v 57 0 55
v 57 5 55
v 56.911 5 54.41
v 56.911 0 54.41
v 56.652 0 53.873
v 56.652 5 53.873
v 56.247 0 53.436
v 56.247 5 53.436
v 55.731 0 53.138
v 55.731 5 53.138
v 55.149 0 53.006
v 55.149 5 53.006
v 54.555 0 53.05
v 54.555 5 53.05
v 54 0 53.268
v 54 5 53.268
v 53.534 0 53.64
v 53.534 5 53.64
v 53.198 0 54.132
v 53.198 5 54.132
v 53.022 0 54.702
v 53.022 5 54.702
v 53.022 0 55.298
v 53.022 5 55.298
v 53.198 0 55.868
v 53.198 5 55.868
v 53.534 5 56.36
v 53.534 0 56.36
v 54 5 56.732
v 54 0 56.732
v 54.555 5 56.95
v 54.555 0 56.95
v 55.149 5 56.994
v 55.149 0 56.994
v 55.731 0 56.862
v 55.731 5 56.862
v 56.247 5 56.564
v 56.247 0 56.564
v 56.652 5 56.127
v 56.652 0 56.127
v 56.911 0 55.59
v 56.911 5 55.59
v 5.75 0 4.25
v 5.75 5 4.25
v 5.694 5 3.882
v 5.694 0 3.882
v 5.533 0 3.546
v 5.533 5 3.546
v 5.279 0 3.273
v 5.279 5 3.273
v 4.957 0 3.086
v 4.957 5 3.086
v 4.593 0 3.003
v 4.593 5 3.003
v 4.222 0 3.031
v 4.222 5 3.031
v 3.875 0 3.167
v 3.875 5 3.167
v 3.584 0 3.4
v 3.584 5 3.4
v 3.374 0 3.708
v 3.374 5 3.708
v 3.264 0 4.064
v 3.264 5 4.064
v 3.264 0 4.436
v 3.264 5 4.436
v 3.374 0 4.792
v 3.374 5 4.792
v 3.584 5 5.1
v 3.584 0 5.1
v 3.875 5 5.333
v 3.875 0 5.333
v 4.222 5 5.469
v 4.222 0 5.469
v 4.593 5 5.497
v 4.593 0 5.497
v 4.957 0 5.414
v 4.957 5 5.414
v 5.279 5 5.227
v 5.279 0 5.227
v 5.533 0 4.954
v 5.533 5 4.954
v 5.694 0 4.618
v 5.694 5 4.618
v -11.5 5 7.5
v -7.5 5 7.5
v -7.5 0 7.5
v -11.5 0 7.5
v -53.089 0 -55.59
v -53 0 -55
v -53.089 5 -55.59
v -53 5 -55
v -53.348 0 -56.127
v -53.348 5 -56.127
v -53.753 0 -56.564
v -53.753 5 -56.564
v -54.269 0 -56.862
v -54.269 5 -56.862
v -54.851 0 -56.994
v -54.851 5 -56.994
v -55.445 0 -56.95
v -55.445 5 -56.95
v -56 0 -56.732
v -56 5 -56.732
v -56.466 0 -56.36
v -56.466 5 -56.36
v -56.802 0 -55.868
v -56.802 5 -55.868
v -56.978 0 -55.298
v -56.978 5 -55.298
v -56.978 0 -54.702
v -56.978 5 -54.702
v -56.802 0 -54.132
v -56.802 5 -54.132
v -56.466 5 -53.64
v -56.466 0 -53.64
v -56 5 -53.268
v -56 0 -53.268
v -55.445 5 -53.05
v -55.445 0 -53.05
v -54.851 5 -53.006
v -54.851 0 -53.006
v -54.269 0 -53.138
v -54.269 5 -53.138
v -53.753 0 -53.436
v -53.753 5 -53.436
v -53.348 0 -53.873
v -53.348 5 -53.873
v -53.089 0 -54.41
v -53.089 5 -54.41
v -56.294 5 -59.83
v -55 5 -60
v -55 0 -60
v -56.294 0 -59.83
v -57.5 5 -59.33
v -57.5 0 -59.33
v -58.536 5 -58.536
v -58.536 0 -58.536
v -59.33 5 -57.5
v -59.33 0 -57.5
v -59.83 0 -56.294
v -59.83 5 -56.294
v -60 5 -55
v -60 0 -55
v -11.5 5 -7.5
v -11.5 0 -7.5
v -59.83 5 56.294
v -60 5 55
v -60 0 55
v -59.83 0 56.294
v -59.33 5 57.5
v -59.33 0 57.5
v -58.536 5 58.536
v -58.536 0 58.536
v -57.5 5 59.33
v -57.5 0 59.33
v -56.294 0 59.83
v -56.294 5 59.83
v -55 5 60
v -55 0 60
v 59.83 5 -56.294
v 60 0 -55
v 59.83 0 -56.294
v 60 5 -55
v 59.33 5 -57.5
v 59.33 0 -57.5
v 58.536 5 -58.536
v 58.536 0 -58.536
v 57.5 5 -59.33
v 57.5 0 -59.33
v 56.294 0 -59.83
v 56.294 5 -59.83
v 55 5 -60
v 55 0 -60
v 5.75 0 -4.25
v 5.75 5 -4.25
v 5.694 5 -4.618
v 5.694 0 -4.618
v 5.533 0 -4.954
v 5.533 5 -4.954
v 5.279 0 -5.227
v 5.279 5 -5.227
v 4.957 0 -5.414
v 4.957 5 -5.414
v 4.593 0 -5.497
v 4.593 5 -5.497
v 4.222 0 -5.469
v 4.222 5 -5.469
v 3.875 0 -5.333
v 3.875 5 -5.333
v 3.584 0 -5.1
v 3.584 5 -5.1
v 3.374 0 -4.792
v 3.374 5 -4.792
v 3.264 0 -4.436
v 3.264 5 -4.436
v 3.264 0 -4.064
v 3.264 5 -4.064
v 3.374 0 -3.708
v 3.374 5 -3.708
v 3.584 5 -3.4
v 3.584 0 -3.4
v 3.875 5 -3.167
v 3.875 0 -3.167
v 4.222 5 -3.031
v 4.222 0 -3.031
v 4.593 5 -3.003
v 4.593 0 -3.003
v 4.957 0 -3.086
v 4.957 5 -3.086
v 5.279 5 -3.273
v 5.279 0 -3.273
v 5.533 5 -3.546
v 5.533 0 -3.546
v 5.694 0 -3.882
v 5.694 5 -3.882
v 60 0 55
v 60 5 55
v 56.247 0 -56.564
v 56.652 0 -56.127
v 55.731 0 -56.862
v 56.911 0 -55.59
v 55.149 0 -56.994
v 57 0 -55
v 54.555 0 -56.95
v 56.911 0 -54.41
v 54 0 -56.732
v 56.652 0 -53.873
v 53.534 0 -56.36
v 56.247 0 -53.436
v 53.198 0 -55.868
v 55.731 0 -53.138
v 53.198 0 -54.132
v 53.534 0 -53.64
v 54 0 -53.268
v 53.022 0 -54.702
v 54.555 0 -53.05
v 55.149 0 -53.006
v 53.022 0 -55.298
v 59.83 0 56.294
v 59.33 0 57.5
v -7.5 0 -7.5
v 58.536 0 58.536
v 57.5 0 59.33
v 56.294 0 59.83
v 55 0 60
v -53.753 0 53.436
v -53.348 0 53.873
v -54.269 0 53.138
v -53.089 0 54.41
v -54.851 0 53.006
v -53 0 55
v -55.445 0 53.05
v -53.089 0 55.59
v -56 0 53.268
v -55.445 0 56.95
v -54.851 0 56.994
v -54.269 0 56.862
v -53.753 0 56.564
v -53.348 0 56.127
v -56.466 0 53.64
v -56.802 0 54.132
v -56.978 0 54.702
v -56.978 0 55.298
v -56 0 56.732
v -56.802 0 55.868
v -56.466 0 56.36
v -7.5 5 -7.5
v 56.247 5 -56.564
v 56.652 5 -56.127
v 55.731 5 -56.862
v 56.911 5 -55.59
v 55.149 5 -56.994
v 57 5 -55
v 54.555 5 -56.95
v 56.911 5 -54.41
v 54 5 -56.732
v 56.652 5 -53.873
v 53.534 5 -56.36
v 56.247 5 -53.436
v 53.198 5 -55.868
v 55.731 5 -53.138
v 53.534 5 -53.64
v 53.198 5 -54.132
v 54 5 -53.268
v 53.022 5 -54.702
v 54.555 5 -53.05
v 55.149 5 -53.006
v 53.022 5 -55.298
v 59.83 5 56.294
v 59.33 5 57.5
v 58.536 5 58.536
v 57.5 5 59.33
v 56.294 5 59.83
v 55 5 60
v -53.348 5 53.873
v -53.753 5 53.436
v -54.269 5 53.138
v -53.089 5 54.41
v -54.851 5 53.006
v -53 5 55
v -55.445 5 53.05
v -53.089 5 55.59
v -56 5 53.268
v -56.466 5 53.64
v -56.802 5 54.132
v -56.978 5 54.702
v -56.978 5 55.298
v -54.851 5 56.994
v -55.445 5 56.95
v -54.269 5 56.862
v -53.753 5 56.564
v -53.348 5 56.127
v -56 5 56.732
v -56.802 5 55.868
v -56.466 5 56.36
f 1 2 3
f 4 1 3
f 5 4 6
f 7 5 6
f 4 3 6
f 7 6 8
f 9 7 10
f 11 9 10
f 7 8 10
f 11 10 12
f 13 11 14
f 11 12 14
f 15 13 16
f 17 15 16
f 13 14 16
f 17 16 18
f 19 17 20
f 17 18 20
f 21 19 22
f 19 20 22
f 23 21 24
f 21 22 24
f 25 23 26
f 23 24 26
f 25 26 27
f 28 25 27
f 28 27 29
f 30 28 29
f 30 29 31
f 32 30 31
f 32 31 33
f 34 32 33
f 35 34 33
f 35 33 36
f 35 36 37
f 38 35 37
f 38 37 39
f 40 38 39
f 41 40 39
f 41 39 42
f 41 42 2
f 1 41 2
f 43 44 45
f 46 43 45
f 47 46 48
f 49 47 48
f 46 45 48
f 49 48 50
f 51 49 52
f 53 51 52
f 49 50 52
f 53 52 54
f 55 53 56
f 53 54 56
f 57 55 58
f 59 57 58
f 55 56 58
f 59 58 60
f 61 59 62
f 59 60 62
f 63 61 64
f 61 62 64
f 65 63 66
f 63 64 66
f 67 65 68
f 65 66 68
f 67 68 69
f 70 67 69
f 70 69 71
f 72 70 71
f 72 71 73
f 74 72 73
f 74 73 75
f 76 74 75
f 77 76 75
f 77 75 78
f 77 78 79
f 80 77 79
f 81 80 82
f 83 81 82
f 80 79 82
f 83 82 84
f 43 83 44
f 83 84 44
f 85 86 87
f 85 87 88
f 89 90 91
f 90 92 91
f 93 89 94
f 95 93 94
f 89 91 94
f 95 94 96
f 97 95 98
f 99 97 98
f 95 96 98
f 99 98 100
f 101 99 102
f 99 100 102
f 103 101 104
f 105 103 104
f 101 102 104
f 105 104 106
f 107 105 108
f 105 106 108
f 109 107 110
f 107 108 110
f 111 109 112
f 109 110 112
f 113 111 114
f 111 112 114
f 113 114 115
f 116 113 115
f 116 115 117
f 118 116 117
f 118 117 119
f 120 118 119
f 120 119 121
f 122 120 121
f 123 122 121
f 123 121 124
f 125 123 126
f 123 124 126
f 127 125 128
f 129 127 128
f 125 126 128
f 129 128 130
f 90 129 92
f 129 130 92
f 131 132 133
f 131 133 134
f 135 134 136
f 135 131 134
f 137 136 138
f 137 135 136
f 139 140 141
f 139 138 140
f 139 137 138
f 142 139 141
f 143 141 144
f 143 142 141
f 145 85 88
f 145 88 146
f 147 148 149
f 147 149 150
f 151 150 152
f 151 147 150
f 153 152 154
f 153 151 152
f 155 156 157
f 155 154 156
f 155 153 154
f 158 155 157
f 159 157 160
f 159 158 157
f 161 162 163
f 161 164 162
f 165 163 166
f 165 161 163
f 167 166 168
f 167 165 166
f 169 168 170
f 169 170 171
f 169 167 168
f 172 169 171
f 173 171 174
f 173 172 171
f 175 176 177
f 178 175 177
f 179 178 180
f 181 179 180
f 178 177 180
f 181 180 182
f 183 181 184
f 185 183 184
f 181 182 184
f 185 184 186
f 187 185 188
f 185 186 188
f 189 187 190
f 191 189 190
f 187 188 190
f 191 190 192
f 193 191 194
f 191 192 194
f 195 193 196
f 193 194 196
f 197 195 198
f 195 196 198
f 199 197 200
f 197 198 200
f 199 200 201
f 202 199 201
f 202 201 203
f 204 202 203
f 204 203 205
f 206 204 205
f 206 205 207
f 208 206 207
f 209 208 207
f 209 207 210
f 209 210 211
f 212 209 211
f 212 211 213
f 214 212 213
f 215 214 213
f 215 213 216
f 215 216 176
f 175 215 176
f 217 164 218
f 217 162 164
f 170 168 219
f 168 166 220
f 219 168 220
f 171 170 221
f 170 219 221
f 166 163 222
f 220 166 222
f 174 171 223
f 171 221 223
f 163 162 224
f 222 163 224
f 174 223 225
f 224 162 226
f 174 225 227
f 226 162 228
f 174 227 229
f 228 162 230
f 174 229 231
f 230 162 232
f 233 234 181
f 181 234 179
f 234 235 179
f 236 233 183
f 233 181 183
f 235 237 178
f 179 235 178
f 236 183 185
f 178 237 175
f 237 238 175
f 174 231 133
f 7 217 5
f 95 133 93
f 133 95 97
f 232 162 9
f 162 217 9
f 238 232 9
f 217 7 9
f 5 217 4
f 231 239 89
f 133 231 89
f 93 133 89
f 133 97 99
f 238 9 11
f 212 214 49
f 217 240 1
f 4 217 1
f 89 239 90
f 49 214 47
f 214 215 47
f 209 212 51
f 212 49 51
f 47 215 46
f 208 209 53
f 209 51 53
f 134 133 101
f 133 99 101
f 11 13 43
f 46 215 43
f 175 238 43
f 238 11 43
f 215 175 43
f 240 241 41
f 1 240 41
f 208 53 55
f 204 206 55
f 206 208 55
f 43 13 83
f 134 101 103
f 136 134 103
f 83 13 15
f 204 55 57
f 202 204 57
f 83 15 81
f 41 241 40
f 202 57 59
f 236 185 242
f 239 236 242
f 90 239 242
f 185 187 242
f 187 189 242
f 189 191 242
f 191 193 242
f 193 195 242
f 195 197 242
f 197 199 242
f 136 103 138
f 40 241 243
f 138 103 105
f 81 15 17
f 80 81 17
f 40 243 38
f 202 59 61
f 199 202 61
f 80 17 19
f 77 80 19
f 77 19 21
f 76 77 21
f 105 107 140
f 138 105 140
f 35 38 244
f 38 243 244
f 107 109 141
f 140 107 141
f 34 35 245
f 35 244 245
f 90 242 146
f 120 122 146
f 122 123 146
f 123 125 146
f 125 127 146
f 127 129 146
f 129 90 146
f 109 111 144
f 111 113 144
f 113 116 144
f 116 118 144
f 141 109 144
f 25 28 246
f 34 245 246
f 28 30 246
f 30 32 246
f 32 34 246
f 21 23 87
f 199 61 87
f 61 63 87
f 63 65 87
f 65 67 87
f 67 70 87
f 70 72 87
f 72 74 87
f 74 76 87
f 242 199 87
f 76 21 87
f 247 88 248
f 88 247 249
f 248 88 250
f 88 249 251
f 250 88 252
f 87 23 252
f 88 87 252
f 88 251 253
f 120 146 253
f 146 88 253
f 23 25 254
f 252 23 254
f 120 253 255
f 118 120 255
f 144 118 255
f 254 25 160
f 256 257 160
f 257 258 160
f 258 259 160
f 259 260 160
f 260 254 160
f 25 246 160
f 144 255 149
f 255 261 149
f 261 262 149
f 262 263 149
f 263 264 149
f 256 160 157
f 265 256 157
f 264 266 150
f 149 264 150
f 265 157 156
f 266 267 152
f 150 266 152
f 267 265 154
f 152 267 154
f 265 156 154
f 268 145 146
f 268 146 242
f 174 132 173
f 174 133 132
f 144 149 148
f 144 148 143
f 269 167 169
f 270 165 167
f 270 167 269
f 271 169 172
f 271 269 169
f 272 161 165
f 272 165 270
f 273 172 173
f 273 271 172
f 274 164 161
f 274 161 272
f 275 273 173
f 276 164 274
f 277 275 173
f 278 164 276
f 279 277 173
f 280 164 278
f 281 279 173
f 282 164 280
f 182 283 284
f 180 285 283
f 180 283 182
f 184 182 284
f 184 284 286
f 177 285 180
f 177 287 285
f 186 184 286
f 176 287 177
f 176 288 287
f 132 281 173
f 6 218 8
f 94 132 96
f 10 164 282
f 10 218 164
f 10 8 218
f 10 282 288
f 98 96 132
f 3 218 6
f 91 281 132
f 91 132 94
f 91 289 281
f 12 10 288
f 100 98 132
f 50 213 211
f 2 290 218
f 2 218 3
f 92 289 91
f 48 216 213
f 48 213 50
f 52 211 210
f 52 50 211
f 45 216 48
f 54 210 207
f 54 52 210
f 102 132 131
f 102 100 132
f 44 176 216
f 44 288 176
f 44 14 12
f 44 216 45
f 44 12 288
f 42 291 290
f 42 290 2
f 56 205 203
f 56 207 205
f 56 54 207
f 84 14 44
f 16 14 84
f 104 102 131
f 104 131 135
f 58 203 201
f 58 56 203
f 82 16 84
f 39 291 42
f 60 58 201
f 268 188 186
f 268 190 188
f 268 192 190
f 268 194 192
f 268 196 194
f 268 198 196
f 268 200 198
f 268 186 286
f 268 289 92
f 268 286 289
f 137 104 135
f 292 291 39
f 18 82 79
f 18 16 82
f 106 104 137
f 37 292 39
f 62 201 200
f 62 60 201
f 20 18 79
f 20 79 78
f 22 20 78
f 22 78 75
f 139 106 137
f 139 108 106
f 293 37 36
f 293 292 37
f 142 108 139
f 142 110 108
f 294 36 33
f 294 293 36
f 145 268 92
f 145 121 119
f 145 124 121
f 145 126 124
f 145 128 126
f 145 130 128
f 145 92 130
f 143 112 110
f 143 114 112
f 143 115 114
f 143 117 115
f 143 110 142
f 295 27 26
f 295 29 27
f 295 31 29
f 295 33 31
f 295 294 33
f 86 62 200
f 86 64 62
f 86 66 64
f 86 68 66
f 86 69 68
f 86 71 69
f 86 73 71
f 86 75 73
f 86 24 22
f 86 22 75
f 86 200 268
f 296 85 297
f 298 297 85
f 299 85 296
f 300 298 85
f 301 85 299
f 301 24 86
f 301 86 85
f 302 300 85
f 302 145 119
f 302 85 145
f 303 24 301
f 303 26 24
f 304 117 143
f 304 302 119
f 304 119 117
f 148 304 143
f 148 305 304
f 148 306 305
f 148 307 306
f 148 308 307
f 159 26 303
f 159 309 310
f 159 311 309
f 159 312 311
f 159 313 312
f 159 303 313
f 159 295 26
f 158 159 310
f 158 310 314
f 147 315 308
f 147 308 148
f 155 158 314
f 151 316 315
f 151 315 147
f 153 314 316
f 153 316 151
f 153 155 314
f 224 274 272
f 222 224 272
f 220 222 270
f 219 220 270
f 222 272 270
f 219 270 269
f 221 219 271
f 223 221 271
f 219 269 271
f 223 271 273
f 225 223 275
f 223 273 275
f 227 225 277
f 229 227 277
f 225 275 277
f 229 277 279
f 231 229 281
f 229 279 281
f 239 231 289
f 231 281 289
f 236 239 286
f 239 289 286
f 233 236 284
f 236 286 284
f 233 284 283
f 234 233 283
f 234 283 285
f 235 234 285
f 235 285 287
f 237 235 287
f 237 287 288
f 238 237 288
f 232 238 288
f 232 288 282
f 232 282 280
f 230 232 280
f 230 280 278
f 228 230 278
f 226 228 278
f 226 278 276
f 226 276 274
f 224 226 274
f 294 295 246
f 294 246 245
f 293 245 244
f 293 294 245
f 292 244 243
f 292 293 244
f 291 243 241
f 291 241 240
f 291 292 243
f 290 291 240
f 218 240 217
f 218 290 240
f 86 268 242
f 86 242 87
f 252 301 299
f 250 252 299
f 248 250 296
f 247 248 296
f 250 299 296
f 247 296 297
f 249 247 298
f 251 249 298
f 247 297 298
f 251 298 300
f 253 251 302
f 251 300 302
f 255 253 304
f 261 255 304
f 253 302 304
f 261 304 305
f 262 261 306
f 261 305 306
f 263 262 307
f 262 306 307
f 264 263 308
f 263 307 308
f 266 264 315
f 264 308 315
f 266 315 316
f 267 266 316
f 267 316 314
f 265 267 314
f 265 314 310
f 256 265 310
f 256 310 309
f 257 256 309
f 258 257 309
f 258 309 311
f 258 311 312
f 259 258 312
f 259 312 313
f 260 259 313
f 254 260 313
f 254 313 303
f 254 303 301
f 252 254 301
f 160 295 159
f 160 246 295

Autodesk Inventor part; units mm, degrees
ref_plane "YZ Plane" through (0, 0, 0) normal (1, 0, 0) x (0, 1, 0)
ref_plane "XZ Plane" through (0, 0, 0) normal (0, 1, 0) x (-1, 0, 0)
ref_plane "XY Plane" through (0, 0, 0) normal (0, 0, 1) x (1, 0, 0)
sketch "Sketch1" plane through (0, 0, 0) normal (0, 1, 0) x (-1, 0, 0)
  line L0 (-60, 60) -> (60, 60)
  line L1 (60, 60) -> (60, -60)
  line L2 (60, -60) -> (-60, -60)
  line L3 (-60, -60) -> (-60, 60)
  line L4 (-60, 60) -> (60, -60) construction
  line L5 (60, 60) -> (-60, -60) construction
  point P0 (0, 0)
  dimension "d0" = 120
  dimension "d1" = 120
extrude "Extrusion1" add sketch "Sketch1" along normal blind 5
sketch "Sketch2" plane through (0, 5, 0) normal (0, 1, 0) x (1, 0, 0)
  line L0 (55, -55) -> (-55, -55) construction
  line L1 (-55, -55) -> (-55, 55) construction
  line L2 (-55, 55) -> (55, 55) construction
  line L3 (55, 55) -> (55, -55) construction
  line L4 (55, -55) -> (-55, 55) construction
  line L5 (-55, -55) -> (55, 55) construction
  circle A0 centre (-55, 55) radius 2
  circle A1 centre (-55, -55) radius 2
  circle A2 centre (55, 55) radius 2
  circle A3 centre (55, -55) radius 2
  point P0 (0, 0)
  dimension "d4" = 110
  dimension "d5" = 110
  dimension "d6" = 4
  dimension "d7" = 4
  dimension "d8" = 4
  dimension "d9" = 4
extrude "Extrusion2" cut sketch "Sketch2" against normal blind 5
fillet "Fillet1" radius 5 4 edges at (60, 2.5, -60) (60, 2.5, 60) (-60, 2.5, -60) (-60, 2.5, 60)
sketch "Sketch4" plane through (0, 5, 0) normal (0, 1, 0) x (1, 0, 0)
  line L0 (-11.5, 7.5) -> (-7.5, 7.5)
  line L1 (-7.5, 7.5) -> (-7.5, -7.5)
  line L2 (-7.5, -7.5) -> (-11.5, -7.5)
  line L3 (-11.5, -7.5) -> (-11.5, 7.5)
  line L4 (-11.5, 7.5) -> (-7.5, -7.5) construction
  line L5 (-7.5, 7.5) -> (-11.5, -7.5) construction
  circle A0 centre (4.5, 4.25) radius 1.25
  circle A1 centre (4.5, -4.25) radius 1.25
  point P0 (0, 0)
  point P1 (-9.5, 0)
  dimension "d14" = 4
  dimension "d15" = 15
  dimension "d16" = 9.5
  dimension "d17" = 14
  dimension "d18" = 14
  dimension "d19" = 2.5
  dimension "d20" = 2.5
  dimension "d21" = 8.5
  dimension "d22" = 4.25
extrude "Extrusion3" cut sketch "Sketch4" against normal blind 10
properties part number "Calibration Arena"
